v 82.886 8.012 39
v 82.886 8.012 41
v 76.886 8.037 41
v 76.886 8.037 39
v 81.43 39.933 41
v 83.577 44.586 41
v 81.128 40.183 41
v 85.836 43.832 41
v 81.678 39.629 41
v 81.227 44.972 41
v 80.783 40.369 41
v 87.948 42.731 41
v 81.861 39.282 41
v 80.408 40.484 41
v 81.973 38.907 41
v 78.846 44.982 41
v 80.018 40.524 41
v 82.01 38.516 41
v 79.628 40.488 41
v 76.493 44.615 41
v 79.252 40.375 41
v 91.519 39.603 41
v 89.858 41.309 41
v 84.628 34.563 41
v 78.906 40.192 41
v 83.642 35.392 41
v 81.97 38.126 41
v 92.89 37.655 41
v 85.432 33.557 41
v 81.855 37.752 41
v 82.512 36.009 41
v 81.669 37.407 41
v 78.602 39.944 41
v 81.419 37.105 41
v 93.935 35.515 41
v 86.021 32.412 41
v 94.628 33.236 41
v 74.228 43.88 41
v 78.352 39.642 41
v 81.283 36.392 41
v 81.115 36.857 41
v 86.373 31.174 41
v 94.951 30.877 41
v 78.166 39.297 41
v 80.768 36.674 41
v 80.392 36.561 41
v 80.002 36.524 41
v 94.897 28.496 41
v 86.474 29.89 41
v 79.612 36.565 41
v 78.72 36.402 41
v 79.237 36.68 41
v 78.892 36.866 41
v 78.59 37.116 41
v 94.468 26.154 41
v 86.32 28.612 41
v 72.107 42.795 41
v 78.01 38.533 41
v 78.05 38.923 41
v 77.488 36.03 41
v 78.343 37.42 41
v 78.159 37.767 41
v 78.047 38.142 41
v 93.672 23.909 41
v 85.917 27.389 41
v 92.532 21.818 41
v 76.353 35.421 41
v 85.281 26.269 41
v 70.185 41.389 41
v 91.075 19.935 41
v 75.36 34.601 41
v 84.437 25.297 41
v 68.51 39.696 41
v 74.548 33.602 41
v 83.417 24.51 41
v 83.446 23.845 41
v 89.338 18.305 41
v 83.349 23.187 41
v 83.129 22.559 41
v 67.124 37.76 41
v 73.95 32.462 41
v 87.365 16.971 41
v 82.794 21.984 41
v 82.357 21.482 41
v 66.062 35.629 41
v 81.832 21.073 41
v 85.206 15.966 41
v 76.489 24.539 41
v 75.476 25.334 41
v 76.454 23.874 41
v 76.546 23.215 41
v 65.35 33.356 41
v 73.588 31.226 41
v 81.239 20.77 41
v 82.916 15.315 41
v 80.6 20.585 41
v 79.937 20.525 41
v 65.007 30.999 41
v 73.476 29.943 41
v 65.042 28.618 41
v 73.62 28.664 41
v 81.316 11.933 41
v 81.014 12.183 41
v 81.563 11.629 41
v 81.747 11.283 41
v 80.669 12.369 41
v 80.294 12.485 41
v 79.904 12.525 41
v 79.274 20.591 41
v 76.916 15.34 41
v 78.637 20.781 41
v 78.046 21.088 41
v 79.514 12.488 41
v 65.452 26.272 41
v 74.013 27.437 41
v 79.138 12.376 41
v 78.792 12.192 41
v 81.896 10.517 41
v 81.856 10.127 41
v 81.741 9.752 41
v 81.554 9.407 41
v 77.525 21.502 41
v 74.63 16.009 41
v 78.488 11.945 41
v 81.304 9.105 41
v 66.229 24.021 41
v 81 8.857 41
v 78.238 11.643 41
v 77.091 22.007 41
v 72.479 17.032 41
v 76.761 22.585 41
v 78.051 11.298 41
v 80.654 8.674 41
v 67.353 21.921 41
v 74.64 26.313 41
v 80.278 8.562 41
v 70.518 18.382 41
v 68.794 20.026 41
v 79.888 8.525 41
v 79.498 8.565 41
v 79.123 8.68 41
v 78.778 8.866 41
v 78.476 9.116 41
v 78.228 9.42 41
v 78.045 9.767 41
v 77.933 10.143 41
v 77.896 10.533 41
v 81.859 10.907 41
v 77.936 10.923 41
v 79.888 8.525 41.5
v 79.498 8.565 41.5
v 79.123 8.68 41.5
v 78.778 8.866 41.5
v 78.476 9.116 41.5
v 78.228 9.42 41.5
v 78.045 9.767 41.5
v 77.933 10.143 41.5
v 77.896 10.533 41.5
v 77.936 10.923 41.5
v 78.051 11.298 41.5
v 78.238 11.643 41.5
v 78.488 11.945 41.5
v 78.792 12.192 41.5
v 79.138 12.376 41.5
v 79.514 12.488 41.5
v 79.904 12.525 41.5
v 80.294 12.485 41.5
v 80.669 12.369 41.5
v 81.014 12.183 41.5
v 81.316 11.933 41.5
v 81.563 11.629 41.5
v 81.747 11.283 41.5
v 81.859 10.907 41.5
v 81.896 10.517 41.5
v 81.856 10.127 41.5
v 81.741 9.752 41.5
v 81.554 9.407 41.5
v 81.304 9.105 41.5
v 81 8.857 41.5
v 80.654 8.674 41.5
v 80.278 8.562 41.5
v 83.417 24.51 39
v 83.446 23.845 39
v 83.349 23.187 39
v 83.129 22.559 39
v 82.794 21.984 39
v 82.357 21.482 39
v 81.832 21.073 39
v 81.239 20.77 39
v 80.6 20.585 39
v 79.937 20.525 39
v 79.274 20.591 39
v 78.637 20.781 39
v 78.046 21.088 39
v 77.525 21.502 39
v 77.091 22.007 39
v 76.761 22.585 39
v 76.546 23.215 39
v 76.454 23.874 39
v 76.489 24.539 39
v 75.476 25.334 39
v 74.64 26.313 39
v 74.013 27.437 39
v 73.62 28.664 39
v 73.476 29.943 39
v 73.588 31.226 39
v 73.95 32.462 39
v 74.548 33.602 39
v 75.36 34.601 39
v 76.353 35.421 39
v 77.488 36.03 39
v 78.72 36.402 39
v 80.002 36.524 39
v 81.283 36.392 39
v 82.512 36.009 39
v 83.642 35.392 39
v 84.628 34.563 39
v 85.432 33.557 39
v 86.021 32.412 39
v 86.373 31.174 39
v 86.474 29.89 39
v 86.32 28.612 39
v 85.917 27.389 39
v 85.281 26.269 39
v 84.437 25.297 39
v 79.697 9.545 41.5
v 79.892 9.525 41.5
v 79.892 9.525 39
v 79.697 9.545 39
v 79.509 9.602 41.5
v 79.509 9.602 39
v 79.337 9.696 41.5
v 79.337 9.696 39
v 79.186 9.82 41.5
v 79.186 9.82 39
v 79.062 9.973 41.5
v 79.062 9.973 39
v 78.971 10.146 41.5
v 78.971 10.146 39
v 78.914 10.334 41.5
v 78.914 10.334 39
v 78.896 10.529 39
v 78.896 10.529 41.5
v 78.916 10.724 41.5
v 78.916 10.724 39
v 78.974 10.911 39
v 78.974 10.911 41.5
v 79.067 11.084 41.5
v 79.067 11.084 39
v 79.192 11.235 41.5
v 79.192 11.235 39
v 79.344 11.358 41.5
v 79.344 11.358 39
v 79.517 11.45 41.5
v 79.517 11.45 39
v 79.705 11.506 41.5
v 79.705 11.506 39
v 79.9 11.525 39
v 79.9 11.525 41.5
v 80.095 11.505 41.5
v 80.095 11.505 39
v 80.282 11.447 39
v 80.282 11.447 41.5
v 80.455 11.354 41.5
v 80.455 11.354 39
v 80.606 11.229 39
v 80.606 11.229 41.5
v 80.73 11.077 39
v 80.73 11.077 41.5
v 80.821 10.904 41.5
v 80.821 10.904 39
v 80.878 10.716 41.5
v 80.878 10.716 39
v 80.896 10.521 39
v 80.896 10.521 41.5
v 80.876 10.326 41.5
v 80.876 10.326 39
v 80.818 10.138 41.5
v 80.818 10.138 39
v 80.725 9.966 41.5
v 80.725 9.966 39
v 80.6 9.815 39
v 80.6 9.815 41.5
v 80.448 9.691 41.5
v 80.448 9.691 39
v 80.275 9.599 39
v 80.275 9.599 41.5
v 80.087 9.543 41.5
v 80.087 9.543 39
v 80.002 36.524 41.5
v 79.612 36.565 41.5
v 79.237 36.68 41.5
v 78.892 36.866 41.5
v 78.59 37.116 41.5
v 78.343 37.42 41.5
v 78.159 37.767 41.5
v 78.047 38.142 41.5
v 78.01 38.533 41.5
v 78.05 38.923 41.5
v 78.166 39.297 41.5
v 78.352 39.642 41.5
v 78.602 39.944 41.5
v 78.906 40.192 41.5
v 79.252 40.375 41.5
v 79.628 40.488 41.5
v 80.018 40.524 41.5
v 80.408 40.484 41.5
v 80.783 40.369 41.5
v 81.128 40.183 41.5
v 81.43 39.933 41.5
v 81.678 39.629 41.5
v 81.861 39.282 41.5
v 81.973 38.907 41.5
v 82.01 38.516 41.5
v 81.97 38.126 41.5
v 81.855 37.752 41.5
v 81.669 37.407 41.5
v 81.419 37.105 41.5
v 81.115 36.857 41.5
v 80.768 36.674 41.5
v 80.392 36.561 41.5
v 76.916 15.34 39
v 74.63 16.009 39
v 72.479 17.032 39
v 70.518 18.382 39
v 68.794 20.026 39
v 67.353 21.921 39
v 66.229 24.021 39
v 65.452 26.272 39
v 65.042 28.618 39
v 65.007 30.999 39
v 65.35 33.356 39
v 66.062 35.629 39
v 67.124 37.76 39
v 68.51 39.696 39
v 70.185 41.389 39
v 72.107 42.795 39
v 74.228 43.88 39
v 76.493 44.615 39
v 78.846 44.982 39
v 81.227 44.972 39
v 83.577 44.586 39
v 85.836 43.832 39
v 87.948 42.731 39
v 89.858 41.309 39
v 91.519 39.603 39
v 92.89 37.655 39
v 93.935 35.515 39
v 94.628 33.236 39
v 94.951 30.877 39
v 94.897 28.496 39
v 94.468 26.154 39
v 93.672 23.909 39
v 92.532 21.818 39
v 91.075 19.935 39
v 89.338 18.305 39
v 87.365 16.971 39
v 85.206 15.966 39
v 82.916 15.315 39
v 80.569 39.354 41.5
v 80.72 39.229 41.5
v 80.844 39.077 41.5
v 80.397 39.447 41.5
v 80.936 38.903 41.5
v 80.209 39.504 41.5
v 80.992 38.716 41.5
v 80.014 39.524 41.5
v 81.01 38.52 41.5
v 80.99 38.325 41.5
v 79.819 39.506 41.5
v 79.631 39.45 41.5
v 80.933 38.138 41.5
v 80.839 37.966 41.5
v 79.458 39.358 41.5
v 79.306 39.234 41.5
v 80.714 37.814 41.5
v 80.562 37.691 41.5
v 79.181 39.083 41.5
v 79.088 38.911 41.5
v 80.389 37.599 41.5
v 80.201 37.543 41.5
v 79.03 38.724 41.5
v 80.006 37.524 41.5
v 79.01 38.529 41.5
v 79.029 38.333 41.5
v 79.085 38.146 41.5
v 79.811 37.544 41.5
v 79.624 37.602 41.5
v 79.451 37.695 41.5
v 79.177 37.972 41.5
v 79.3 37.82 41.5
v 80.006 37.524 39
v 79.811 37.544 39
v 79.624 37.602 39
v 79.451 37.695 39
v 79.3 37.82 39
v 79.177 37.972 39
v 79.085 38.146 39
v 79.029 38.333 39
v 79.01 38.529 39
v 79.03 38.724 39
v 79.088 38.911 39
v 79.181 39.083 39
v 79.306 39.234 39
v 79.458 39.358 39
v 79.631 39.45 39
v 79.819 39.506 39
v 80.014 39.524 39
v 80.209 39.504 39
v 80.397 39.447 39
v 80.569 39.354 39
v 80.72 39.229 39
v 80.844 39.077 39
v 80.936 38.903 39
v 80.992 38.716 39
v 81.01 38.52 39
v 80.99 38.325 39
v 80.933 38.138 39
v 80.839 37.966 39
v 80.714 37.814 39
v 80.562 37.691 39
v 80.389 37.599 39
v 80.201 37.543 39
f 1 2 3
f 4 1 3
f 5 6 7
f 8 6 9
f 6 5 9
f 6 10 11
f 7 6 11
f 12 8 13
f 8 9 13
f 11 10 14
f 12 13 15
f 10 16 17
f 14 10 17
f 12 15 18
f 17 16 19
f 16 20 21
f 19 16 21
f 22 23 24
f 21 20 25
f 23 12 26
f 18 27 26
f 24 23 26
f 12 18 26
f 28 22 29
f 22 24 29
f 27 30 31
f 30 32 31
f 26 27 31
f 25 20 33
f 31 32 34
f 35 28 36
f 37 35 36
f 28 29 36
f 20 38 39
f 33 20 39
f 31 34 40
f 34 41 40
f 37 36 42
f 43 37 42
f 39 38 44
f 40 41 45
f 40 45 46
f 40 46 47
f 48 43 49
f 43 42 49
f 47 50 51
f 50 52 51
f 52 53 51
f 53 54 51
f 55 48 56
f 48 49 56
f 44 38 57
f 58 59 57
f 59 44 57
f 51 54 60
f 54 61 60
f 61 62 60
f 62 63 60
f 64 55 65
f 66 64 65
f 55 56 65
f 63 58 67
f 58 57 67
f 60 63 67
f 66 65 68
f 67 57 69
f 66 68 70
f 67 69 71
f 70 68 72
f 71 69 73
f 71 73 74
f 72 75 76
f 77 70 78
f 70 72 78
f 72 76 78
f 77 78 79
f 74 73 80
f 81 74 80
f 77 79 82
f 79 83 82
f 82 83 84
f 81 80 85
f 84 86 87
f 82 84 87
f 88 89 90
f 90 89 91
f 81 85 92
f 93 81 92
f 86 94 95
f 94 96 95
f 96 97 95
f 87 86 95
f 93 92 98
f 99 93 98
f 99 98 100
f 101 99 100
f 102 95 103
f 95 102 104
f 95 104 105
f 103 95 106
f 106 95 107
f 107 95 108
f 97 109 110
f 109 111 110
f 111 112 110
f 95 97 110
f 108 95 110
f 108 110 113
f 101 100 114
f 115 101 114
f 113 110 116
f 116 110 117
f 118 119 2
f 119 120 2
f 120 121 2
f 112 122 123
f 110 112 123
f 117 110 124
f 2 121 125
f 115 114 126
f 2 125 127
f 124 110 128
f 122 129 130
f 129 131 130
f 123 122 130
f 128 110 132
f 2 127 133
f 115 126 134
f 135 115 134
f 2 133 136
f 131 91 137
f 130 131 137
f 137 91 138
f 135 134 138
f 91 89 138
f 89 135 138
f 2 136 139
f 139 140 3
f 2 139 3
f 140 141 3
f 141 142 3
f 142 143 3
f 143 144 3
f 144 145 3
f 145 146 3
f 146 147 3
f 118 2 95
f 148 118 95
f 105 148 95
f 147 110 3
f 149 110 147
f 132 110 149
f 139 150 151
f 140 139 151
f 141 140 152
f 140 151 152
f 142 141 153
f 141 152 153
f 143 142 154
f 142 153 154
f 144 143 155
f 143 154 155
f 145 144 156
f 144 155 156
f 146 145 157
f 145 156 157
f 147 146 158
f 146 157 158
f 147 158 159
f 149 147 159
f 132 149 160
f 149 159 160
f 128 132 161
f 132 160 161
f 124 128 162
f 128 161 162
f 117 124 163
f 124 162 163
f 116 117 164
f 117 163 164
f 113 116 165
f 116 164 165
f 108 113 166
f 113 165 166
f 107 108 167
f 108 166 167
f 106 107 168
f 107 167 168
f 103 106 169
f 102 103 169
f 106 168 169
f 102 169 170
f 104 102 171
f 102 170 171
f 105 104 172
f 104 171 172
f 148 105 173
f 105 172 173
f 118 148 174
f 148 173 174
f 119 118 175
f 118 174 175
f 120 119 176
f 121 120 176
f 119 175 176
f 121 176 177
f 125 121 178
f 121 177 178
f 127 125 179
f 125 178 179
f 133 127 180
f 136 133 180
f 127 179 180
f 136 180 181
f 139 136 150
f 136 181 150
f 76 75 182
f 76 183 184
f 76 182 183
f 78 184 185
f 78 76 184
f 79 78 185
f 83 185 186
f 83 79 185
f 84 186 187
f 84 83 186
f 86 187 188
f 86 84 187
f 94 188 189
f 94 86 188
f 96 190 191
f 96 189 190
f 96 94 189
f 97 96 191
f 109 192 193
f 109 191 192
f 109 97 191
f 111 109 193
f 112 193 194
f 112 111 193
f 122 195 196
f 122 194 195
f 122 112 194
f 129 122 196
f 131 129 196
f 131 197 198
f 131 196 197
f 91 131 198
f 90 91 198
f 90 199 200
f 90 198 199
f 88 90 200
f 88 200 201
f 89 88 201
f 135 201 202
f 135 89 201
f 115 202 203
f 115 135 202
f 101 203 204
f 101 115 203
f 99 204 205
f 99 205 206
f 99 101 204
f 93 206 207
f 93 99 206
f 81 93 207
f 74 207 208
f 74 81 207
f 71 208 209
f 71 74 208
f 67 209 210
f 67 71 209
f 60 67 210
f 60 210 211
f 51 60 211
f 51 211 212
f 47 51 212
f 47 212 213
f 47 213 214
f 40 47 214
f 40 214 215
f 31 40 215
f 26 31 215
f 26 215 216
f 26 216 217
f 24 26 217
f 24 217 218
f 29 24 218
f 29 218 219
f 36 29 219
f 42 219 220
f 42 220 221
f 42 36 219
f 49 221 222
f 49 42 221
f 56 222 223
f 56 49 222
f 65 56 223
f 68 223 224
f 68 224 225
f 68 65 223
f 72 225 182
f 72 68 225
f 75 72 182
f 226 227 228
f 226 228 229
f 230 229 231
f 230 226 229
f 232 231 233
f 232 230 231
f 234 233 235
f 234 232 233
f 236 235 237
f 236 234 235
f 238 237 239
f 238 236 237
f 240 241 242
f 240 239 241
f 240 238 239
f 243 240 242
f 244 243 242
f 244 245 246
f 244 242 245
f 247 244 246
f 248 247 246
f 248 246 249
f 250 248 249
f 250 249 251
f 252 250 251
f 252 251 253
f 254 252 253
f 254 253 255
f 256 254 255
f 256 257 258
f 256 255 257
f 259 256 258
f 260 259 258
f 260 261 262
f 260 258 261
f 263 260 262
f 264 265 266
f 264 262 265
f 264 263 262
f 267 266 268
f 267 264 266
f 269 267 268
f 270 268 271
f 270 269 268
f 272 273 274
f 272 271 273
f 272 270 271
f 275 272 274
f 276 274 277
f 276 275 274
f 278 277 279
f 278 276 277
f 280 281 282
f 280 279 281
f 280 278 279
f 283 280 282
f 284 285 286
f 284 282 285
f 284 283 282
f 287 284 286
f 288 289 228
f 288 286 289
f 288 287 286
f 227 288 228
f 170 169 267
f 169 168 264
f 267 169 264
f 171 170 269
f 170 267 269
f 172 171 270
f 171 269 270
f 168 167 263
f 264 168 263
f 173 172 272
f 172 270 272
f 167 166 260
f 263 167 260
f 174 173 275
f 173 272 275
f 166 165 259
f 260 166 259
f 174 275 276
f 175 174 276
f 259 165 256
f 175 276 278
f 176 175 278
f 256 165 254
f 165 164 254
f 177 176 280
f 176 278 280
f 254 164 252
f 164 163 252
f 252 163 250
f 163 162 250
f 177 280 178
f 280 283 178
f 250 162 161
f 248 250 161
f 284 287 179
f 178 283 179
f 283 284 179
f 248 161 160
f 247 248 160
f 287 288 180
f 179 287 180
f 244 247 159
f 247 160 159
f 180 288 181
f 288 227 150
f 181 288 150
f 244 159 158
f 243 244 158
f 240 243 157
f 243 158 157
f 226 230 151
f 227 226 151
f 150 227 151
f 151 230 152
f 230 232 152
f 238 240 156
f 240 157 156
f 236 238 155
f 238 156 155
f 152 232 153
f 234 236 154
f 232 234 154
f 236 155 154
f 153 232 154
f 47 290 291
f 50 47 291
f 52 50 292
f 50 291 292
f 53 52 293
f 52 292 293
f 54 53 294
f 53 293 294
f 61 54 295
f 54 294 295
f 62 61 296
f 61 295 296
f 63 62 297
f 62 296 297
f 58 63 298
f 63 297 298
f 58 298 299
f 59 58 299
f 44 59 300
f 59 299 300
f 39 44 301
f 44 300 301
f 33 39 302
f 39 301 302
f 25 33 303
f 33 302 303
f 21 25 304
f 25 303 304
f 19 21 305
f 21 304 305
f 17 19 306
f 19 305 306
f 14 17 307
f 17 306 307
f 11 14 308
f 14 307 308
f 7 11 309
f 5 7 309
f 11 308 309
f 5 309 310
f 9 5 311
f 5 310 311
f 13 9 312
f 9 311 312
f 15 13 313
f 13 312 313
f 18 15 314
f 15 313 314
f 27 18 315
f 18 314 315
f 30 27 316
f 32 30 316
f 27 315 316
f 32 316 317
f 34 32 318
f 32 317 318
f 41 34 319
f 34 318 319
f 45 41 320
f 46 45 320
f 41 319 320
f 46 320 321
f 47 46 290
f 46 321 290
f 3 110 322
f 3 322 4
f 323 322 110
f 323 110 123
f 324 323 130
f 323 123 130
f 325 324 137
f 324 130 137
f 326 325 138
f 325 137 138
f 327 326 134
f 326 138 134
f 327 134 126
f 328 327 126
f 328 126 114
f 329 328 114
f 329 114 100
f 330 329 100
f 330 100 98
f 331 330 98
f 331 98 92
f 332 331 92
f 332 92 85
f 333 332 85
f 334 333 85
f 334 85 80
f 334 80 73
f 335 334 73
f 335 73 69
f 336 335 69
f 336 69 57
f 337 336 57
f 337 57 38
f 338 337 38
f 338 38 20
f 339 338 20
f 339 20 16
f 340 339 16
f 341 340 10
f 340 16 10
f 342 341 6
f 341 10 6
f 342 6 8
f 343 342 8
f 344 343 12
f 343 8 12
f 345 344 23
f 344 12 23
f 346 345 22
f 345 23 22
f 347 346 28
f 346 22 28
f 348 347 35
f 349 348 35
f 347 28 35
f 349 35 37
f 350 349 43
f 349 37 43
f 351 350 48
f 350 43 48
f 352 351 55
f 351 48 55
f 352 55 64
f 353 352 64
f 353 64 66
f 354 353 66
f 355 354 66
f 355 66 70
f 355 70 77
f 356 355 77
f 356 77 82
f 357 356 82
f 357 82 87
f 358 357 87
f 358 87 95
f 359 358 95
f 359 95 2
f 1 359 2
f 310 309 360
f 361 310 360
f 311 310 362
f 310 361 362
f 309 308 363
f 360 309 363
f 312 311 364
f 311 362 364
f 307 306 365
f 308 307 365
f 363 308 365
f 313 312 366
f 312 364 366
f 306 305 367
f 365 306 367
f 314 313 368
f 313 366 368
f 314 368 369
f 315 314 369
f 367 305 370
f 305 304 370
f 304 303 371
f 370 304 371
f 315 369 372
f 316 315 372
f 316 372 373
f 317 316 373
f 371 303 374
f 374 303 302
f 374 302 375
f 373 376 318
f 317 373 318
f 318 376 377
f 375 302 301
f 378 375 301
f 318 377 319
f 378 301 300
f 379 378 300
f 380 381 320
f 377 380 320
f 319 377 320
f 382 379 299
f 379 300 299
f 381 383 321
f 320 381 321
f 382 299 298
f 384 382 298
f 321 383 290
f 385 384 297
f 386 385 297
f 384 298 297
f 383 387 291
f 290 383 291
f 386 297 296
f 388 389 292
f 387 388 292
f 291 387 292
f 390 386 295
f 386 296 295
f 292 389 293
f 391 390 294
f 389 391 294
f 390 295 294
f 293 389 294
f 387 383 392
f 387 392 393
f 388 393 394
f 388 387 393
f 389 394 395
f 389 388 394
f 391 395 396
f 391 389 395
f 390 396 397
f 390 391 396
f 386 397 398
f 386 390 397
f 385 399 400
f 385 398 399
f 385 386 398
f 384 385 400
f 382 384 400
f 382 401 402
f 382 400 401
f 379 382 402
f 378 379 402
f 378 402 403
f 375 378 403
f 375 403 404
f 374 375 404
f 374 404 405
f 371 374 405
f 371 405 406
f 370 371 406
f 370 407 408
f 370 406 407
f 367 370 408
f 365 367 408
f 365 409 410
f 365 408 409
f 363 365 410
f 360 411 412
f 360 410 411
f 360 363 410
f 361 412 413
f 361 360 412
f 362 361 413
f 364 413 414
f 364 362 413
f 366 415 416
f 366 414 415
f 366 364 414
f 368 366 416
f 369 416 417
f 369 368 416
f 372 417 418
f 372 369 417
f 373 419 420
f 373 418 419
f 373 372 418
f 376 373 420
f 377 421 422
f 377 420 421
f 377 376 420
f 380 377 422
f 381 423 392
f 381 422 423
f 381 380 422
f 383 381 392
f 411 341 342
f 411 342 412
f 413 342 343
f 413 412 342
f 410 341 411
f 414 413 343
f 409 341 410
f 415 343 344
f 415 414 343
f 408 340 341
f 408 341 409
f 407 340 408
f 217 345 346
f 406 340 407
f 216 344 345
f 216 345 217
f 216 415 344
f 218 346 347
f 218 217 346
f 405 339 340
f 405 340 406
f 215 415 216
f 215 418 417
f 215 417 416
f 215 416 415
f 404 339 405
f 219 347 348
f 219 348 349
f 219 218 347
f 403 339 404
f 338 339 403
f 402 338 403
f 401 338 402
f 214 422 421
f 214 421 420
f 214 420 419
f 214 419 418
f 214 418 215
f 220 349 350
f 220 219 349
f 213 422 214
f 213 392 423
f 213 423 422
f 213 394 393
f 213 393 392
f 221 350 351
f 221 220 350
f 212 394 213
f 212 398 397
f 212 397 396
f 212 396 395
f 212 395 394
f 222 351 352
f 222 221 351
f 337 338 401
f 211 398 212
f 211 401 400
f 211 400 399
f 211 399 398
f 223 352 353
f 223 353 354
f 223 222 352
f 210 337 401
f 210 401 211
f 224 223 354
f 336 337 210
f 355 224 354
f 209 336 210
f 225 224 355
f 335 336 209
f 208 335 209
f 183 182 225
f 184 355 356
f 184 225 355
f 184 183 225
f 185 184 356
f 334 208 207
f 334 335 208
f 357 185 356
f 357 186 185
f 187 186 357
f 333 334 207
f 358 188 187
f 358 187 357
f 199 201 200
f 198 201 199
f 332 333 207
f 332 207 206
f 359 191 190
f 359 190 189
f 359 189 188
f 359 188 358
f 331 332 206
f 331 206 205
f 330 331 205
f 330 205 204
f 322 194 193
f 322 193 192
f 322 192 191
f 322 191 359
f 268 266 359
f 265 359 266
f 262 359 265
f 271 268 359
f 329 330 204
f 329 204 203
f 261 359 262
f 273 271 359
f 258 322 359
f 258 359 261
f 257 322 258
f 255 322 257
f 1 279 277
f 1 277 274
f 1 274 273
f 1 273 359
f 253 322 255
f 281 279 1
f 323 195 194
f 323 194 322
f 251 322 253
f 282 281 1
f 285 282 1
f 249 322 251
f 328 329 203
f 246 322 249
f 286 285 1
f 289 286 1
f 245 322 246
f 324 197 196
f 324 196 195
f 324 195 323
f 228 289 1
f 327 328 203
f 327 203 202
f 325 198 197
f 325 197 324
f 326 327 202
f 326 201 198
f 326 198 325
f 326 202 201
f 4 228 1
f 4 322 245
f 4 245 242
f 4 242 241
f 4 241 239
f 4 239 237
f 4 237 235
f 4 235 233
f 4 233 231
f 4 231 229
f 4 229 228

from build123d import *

# Parameters (mm, degrees)
CYLINDER003001001005001001_R     = 3.5
CYLINDER003001001005001001_DEPTH = 2
CYLINDER003001001004002_R        = 1
CYLINDER003001001004002_DEPTH    = 5
CYLINDER003001001004001001_R     = 1
CYLINDER003001001004001001_DEPTH = 5
CYLINDER003001001005001_R        = 6.5
CYLINDER003001001005001_DEPTH    = 2
BOX002_W                         = 10
BOX002_H                         = 6
BOX002_DEPTH                     = 2
CYLINDER003001001004_R           = 2
CYLINDER003001001004_DEPTH       = 0.5
CYLINDER003001001004001_R        = 2
CYLINDER003001001004001_DEPTH    = 0.5
CYLINDER003001001005_R           = 15
CYLINDER003001001005_DEPTH       = 2
CUT002_ROLL_ANGLE                = 180
CUT002_PLACEMENT_ANGLE           = -90.233929


with BuildPart() as cylinder013:
    # Cylinder003001001005001001 → Cylinder003001001005001001 (new body)
    with BuildSketch(Plane(origin=(12, 6, 21), x_dir=(1, 0, 0), z_dir=(0, 0, 1))):
        Circle(CYLINDER003001001005001001_R)
    extrude(amount=CYLINDER003001001005001001_DEPTH)


with BuildPart() as cylinder014:
    # Cylinder003001001004002 → Cylinder003001001004002 (new body)
    with BuildSketch(Plane(origin=(-2.5, 6, 19.5), x_dir=(1, 0, 0), z_dir=(0, 0, 1))):
        Circle(CYLINDER003001001004002_R)
    extrude(amount=CYLINDER003001001004002_DEPTH)


with BuildPart() as cylinder015:
    # Cylinder003001001004001001 → Cylinder003001001004001001 (new body)
    with BuildSketch(Plane(origin=(25.5, 6, 19.5), x_dir=(1, 0, 0), z_dir=(0, 0, 1))):
        Circle(CYLINDER003001001004001001_R)
    extrude(amount=CYLINDER003001001004001001_DEPTH)


with BuildPart() as fusion009:
    # Cylinder003001001005001 → Cylinder003001001005001 (new body)
    with BuildSketch(Plane(origin=(6, 6, 21), x_dir=(1, 0, 0), z_dir=(0, 0, 1))):
        Circle(CYLINDER003001001005001_R)
    extrude(amount=CYLINDER003001001005001_DEPTH)

    # Fusion009: union Cylinder013, Cylinder014, Cylinder015
    add(cylinder013.part)
    add(cylinder014.part)
    add(cylinder015.part)


with BuildPart() as box002:
    # Box002 → Box002 (new body)
    with BuildSketch(Plane(origin=(18, 3, 21), x_dir=(1, 0, 0), z_dir=(0, 0, 1))):
        with Locations((5, 3)):
            Rectangle(BOX002_W, BOX002_H)
    extrude(amount=BOX002_DEPTH)


with BuildPart() as cylinder003001001004:
    # Cylinder003001001004 → Cylinder003001001004 (new body)
    with BuildSketch(Plane(origin=(-2.5, 6, 20.5), x_dir=(1, 0, 0), z_dir=(0, 0, 1))):
        Circle(CYLINDER003001001004_R)
    extrude(amount=CYLINDER003001001004_DEPTH)


with BuildPart() as cylinder010:
    # Cylinder003001001004001 → Cylinder003001001004001 (new body)
    with BuildSketch(Plane(origin=(25.5, 6, 20.5), x_dir=(1, 0, 0), z_dir=(0, 0, 1))):
        Circle(CYLINDER003001001004001_R)
    extrude(amount=CYLINDER003001001004001_DEPTH)


with BuildPart() as guide1:
    # Cylinder003001001005 → Cylinder003001001005 (new body)
    with BuildSketch(Plane(origin=(6, 6, 21), x_dir=(1, 0, 0), z_dir=(0, 0, 1))):
        Circle(CYLINDER003001001005_R)
    extrude(amount=CYLINDER003001001005_DEPTH)

    # Fusion008: union Box002, Cylinder003001001004, Cylinder010
    add(box002.part)
    add(cylinder003001001004.part)
    add(cylinder010.part)

    # Cut002: cut Fusion009
    add(fusion009.part, mode=Mode.SUBTRACT)


with BuildPart() as guide1_1:
    # Cut002 roll: moved
    add(guide1.part.rotate(Axis((0, 0, 0), (1, 0, 0)), CUT002_ROLL_ANGLE))


with BuildPart() as guide1_2:
    # Cut002 placement: moved
    add(guide1_1.part.moved(Location((86, 36, 62))).rotate(Axis((86, 36, 62), (0, 0, 1)), CUT002_PLACEMENT_ANGLE))


solid = guide1_2.part
